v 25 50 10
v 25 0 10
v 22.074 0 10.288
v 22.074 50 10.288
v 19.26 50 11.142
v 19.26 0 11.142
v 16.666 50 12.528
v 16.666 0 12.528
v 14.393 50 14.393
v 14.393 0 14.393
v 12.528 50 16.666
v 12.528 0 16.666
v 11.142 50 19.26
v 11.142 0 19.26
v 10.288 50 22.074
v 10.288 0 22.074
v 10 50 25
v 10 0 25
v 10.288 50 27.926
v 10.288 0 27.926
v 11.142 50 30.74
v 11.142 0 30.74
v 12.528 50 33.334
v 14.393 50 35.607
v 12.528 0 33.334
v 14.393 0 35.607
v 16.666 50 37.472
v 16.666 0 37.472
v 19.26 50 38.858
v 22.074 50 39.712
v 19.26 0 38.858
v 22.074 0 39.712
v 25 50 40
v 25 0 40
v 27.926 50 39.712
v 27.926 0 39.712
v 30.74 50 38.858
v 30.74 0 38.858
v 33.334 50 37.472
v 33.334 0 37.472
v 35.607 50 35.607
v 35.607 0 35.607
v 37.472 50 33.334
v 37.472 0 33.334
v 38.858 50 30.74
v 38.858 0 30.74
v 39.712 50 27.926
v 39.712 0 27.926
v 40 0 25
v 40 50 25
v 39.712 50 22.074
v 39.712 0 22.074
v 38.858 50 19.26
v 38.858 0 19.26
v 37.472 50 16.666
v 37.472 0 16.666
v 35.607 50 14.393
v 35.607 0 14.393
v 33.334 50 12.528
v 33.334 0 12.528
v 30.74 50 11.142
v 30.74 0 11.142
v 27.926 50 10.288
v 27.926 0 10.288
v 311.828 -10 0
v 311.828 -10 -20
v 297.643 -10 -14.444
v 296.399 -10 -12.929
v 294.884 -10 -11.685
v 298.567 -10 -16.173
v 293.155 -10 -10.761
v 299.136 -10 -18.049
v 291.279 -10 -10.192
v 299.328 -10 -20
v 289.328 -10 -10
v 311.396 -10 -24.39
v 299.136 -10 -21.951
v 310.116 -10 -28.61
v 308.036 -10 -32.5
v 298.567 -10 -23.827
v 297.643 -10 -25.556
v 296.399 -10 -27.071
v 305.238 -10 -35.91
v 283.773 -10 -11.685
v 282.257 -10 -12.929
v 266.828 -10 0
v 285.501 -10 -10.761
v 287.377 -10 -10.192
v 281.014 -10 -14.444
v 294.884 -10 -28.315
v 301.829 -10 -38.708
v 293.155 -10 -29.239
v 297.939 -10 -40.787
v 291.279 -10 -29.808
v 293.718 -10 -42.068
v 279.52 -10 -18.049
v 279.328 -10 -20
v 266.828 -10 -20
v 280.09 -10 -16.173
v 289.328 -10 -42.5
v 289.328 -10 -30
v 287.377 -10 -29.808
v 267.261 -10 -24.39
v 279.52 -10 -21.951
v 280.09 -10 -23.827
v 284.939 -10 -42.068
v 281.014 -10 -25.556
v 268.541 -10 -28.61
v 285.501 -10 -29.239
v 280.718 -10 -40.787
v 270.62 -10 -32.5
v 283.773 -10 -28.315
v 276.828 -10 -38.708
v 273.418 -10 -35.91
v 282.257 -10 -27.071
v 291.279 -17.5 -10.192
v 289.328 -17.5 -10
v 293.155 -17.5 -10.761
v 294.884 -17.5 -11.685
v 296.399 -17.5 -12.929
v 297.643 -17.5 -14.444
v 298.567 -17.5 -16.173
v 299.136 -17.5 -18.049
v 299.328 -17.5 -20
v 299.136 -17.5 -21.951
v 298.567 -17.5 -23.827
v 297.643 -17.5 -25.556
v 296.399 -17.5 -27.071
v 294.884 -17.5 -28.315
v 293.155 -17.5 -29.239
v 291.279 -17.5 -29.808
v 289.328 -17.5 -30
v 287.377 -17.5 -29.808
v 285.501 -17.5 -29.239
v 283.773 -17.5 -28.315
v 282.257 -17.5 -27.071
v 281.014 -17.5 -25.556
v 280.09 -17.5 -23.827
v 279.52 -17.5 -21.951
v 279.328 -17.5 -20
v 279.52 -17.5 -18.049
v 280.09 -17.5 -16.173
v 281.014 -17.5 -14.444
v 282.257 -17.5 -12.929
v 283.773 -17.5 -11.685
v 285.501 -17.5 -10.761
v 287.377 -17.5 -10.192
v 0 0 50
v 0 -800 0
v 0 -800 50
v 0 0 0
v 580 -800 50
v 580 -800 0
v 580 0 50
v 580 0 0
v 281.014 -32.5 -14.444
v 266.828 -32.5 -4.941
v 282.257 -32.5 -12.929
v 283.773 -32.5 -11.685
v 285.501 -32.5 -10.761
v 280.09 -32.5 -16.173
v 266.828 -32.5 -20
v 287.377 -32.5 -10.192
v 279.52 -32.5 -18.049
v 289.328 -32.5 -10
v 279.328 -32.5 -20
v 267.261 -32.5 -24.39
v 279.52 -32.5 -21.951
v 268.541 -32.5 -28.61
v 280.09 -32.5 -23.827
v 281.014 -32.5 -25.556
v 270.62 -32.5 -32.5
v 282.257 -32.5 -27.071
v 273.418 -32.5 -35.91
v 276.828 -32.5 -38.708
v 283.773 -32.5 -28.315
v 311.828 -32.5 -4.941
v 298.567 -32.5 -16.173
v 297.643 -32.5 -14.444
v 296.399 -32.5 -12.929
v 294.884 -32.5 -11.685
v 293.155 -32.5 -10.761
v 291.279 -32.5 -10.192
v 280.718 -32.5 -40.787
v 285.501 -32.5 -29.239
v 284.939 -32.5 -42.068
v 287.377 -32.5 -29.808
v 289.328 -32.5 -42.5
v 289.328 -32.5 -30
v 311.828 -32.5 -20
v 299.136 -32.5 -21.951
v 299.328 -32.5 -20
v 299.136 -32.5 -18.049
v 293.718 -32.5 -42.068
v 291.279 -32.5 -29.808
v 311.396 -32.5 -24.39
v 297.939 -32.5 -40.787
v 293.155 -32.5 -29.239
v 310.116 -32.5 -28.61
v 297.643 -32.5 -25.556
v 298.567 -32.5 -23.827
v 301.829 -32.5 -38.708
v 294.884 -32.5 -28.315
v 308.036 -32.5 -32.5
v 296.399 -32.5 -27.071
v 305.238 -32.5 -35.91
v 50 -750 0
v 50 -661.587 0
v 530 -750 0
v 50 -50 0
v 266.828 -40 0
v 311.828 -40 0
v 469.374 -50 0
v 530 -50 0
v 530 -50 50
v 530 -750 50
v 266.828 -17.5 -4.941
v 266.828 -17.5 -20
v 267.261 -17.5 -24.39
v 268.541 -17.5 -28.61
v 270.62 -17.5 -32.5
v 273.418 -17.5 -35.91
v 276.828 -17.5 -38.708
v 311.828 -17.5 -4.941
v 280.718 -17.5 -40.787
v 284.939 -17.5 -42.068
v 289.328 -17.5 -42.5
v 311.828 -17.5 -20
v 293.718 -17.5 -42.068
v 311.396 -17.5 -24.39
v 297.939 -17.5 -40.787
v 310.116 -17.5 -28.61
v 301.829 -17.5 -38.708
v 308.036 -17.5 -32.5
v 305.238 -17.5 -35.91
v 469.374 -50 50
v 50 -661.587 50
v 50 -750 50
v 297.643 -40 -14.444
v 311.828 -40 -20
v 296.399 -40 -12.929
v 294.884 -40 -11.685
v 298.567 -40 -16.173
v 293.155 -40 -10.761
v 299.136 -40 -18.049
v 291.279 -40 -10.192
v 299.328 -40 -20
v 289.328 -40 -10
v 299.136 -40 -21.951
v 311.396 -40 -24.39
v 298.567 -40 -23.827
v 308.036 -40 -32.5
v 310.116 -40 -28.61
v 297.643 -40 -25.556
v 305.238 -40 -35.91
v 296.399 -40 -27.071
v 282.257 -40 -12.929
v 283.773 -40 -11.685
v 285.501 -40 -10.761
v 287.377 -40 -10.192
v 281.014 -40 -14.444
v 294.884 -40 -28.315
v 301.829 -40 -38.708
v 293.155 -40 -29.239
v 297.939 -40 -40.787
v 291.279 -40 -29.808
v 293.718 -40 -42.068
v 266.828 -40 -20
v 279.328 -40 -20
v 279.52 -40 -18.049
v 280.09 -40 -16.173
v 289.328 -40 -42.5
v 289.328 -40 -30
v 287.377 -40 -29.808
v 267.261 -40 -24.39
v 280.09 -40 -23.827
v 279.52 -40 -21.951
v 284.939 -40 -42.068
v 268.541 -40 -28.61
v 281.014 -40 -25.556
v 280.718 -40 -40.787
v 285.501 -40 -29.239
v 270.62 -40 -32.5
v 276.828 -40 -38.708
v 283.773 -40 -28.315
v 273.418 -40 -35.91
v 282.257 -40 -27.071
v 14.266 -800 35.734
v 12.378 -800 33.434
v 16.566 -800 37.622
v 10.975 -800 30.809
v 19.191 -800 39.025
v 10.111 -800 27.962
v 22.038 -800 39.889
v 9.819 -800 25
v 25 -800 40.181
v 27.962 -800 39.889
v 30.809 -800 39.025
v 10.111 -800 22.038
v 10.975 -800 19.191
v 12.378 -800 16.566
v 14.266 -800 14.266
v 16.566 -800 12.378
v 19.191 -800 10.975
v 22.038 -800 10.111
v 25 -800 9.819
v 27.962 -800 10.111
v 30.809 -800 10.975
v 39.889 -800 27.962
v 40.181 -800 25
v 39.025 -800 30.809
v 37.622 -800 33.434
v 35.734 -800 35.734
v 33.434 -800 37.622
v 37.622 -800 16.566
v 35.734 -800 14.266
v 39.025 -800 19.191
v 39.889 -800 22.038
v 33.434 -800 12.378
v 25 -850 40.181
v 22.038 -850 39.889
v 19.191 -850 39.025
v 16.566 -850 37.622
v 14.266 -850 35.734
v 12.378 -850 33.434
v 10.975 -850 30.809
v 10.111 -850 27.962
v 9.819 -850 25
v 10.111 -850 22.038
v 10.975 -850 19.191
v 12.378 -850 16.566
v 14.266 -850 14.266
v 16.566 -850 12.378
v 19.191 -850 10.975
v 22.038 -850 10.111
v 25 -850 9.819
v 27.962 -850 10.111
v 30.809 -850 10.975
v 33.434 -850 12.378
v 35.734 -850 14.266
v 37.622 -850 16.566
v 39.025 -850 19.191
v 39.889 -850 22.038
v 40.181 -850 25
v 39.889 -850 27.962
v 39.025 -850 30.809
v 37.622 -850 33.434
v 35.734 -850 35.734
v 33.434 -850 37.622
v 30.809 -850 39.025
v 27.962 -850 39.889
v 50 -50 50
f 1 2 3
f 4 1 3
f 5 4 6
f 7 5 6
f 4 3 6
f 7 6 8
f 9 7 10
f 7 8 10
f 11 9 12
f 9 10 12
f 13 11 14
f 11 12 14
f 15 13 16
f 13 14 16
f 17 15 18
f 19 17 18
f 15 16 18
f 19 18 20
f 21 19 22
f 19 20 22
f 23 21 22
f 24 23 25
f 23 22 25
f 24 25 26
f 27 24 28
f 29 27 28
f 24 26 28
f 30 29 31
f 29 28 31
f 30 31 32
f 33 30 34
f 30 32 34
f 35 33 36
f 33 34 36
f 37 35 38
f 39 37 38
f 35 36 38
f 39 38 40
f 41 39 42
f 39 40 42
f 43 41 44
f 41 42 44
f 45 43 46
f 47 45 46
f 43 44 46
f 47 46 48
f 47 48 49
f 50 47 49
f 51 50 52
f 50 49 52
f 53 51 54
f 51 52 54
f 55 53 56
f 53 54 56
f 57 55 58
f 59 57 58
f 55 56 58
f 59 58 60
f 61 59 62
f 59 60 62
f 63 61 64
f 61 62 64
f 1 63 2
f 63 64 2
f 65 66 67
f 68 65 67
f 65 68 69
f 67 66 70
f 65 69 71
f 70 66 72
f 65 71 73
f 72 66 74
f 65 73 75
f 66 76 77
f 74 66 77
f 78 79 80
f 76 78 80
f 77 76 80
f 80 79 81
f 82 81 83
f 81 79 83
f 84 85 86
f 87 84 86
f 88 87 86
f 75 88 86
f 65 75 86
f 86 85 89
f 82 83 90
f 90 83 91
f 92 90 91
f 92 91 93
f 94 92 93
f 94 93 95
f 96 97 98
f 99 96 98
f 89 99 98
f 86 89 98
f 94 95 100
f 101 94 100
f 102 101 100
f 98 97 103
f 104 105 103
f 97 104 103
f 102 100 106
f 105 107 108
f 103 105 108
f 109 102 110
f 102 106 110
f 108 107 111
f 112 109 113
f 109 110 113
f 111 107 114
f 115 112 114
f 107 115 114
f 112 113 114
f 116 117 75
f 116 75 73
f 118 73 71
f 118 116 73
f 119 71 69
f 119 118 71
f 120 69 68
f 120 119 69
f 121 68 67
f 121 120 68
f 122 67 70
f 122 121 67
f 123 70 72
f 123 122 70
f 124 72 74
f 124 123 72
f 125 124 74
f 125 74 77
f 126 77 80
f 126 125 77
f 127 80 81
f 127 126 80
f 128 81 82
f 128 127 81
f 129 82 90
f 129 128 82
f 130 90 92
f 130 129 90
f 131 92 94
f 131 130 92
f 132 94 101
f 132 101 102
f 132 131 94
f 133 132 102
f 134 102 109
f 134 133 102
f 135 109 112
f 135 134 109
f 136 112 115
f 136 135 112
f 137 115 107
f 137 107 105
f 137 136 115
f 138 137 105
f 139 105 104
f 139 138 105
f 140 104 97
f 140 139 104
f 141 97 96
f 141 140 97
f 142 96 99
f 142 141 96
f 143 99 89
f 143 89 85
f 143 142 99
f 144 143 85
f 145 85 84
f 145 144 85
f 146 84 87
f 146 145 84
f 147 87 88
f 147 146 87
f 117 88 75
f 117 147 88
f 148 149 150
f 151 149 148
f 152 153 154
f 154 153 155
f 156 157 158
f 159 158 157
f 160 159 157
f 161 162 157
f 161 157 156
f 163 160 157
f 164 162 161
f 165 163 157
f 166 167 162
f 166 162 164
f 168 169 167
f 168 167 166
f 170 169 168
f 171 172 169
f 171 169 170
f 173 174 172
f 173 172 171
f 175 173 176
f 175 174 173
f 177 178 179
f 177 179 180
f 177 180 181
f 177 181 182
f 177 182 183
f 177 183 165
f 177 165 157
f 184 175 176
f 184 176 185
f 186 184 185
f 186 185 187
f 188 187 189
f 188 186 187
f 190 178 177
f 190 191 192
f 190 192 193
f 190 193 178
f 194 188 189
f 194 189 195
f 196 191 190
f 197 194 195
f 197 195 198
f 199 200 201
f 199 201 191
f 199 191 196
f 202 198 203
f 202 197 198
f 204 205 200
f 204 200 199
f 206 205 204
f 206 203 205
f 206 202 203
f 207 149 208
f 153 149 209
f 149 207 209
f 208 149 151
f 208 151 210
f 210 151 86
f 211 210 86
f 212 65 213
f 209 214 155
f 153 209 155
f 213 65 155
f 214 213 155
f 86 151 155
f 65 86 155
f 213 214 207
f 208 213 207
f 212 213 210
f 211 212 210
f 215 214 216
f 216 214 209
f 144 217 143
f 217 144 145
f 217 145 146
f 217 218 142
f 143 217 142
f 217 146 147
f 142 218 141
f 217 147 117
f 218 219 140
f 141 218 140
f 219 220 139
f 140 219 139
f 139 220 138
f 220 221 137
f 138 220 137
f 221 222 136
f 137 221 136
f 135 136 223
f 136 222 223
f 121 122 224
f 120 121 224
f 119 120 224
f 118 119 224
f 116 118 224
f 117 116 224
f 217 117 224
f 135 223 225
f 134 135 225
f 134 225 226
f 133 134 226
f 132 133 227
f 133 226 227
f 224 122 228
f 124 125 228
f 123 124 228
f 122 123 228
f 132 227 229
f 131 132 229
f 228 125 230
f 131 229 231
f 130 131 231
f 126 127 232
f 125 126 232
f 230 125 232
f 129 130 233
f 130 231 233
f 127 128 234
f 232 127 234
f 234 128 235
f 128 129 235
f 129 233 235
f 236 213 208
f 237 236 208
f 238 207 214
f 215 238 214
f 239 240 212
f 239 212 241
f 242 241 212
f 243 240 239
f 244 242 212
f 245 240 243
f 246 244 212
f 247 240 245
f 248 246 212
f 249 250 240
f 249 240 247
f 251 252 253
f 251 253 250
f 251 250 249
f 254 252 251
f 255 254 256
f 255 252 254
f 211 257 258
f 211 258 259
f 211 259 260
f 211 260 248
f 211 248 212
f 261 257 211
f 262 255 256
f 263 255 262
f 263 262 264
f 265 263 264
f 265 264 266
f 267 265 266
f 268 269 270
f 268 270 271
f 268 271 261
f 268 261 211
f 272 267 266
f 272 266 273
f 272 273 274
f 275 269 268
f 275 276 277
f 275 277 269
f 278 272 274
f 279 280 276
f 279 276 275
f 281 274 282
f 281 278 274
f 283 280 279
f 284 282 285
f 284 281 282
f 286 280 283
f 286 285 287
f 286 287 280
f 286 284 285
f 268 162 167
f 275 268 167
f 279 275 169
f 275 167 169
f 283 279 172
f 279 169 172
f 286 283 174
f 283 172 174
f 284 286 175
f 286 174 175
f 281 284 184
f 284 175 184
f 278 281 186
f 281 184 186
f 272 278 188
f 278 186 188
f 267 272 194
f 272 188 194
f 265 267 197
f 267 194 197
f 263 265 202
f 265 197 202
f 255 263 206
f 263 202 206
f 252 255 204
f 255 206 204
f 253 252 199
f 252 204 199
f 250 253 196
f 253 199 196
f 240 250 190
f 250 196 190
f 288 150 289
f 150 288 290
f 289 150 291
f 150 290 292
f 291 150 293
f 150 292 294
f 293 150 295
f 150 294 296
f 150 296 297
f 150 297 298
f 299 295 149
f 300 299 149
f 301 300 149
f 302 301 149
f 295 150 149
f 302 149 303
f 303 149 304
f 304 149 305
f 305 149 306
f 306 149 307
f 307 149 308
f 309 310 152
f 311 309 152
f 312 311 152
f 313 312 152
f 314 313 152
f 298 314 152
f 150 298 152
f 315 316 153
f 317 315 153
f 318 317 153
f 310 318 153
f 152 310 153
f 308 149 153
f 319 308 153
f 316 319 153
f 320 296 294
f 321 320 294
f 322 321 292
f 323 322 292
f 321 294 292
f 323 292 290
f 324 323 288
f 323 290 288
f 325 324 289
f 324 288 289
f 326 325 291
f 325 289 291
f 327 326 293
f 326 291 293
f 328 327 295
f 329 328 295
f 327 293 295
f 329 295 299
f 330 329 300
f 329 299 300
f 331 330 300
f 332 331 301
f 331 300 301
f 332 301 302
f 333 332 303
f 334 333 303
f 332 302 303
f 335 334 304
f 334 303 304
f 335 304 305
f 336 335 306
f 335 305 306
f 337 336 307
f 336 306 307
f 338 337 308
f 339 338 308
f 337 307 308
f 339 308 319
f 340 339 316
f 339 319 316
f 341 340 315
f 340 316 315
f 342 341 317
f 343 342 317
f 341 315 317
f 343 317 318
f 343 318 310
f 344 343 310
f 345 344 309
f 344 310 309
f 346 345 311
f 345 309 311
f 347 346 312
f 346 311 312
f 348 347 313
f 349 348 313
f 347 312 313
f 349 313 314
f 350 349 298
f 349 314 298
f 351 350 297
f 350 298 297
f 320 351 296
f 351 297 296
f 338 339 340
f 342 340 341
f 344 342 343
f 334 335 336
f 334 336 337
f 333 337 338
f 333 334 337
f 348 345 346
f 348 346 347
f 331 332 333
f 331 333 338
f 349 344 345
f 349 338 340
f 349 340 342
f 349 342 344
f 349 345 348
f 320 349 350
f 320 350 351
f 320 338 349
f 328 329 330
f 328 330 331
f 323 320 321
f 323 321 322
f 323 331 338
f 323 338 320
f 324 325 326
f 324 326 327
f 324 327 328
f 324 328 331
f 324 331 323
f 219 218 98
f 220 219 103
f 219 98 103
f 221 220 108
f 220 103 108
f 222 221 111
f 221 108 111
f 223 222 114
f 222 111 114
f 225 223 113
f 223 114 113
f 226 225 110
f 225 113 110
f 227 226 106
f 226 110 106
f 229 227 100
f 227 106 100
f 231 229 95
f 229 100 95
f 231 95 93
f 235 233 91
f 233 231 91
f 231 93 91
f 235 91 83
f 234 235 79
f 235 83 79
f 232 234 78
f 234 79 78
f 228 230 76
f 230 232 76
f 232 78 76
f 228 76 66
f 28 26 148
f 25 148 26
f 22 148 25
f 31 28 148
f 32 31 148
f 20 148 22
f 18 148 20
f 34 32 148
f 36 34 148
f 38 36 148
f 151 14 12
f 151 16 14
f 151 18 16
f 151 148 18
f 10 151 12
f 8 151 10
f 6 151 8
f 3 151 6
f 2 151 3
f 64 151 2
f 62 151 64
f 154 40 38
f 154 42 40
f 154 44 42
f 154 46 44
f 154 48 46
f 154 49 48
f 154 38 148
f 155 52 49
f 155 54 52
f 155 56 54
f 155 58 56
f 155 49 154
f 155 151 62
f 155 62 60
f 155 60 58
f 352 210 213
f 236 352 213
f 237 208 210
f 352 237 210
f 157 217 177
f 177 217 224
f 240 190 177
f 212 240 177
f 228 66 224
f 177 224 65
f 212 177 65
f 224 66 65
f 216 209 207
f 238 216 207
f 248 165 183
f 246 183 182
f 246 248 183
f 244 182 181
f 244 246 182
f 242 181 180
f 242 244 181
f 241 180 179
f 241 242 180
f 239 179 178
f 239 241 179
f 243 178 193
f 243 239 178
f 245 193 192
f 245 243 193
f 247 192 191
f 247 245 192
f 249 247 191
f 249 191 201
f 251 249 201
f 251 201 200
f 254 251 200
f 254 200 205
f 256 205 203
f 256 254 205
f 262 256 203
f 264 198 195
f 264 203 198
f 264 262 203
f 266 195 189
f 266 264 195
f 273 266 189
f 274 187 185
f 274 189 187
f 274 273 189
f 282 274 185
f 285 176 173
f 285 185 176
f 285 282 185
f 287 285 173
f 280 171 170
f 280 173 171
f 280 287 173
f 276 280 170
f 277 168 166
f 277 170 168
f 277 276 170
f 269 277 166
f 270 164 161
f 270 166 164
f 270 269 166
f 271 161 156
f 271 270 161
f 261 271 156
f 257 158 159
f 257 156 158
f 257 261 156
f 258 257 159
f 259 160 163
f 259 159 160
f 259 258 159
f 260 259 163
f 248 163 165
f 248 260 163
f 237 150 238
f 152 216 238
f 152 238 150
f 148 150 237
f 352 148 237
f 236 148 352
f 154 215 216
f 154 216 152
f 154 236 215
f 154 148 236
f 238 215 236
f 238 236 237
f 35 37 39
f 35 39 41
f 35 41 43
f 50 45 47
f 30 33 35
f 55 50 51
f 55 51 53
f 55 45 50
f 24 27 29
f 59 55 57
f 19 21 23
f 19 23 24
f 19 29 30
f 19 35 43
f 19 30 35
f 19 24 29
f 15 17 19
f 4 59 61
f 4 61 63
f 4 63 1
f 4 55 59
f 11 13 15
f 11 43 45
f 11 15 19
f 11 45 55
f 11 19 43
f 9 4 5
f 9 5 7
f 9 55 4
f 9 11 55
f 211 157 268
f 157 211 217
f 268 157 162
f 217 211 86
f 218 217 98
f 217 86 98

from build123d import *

# Parameters (mm, degrees)
ESQUISSE1_W             = 580
ESQUISSE1_H             = 800
BOSS_EXTRU_1_DEPTH      = 50
ESQUISSE2_R             = 15
BOSS_EXTRU_2_DEPTH      = 50
ESQUISSE3_R             = 15.180649449
BOSS_EXTRU_3_DEPTH      = 50
ESQUISSE4_R             = 10
BOSS_EXTRU_4_DEPTH      = 15
ESQUISSE5_W             = 76.670865877
ESQUISSE5_H             = 44.284034601
ENL_V_MAT_EXTRU_1_DEPTH = 7.5


with BuildPart() as part:
    # Esquisse1 → Boss.-Extru.1 (new body)
    with BuildSketch(Plane.XY):
        with Locations((290, -400)):
            Rectangle(ESQUISSE1_W, ESQUISSE1_H)
        Polygon((50, -50), (469.374013789, -50), (50, -661.587103442), align=None, mode=Mode.SUBTRACT)
        Polygon((530, -50), (530, -750), (50, -750), align=None, mode=Mode.SUBTRACT)
    extrude(amount=BOSS_EXTRU_1_DEPTH)

    # Esquisse2 → Boss.-Extru.2 (add)
    with BuildSketch(Plane(origin=(0, 0, 0), x_dir=(1, 0, 0), z_dir=(0, 1, 0))):
        with Locations(Location((25, -25, 0), (0, 0, 90))):
            Circle(ESQUISSE2_R)
    extrude(amount=BOSS_EXTRU_2_DEPTH)

    # Esquisse3 → Boss.-Extru.3 (add)
    with BuildSketch(Plane.XZ.offset(800)):
        with Locations(Location((25, 25, 0), (0, 0, 90))):
            Circle(ESQUISSE3_R)
    extrude(amount=BOSS_EXTRU_3_DEPTH)

    # Esquisse4 → Boss.-Extru.4 (add, symmetric)
    with BuildSketch(Plane(origin=(0, -25, 0), x_dir=(1, 0, 0), z_dir=(0, 1, 0))):
        with BuildLine():
            Line((311.828309325, -8.678116476), (266.828309325, -8.678116476))
            Line((266.828309325, -8.678116476), (266.828309325, 20))
            ThreePointArc((266.828309325, 20), (289.328309325, 42.5), (311.828309325, 20))
            Line((311.828309325, 20), (311.828309325, -8.678116476))
        make_face()
        with Locations(Location((289.328309325, 20, 0), (0, 0, 270))):
            Circle(ESQUISSE4_R, mode=Mode.SUBTRACT)
    extrude(amount=BOSS_EXTRU_4_DEPTH, both=True)

    # Esquisse5 → Enlèv. mat.-Extru.1 (cut, symmetric)
    with BuildSketch(Plane(origin=(0, -25, 0), x_dir=(1, 0, 0), z_dir=(0, 1, 0))):
        with Locations((288.67808852, 27.082772298)):
            Rectangle(ESQUISSE5_W, ESQUISSE5_H)
    extrude(amount=ENL_V_MAT_EXTRU_1_DEPTH, both=True, mode=Mode.SUBTRACT)


solid = part.part
